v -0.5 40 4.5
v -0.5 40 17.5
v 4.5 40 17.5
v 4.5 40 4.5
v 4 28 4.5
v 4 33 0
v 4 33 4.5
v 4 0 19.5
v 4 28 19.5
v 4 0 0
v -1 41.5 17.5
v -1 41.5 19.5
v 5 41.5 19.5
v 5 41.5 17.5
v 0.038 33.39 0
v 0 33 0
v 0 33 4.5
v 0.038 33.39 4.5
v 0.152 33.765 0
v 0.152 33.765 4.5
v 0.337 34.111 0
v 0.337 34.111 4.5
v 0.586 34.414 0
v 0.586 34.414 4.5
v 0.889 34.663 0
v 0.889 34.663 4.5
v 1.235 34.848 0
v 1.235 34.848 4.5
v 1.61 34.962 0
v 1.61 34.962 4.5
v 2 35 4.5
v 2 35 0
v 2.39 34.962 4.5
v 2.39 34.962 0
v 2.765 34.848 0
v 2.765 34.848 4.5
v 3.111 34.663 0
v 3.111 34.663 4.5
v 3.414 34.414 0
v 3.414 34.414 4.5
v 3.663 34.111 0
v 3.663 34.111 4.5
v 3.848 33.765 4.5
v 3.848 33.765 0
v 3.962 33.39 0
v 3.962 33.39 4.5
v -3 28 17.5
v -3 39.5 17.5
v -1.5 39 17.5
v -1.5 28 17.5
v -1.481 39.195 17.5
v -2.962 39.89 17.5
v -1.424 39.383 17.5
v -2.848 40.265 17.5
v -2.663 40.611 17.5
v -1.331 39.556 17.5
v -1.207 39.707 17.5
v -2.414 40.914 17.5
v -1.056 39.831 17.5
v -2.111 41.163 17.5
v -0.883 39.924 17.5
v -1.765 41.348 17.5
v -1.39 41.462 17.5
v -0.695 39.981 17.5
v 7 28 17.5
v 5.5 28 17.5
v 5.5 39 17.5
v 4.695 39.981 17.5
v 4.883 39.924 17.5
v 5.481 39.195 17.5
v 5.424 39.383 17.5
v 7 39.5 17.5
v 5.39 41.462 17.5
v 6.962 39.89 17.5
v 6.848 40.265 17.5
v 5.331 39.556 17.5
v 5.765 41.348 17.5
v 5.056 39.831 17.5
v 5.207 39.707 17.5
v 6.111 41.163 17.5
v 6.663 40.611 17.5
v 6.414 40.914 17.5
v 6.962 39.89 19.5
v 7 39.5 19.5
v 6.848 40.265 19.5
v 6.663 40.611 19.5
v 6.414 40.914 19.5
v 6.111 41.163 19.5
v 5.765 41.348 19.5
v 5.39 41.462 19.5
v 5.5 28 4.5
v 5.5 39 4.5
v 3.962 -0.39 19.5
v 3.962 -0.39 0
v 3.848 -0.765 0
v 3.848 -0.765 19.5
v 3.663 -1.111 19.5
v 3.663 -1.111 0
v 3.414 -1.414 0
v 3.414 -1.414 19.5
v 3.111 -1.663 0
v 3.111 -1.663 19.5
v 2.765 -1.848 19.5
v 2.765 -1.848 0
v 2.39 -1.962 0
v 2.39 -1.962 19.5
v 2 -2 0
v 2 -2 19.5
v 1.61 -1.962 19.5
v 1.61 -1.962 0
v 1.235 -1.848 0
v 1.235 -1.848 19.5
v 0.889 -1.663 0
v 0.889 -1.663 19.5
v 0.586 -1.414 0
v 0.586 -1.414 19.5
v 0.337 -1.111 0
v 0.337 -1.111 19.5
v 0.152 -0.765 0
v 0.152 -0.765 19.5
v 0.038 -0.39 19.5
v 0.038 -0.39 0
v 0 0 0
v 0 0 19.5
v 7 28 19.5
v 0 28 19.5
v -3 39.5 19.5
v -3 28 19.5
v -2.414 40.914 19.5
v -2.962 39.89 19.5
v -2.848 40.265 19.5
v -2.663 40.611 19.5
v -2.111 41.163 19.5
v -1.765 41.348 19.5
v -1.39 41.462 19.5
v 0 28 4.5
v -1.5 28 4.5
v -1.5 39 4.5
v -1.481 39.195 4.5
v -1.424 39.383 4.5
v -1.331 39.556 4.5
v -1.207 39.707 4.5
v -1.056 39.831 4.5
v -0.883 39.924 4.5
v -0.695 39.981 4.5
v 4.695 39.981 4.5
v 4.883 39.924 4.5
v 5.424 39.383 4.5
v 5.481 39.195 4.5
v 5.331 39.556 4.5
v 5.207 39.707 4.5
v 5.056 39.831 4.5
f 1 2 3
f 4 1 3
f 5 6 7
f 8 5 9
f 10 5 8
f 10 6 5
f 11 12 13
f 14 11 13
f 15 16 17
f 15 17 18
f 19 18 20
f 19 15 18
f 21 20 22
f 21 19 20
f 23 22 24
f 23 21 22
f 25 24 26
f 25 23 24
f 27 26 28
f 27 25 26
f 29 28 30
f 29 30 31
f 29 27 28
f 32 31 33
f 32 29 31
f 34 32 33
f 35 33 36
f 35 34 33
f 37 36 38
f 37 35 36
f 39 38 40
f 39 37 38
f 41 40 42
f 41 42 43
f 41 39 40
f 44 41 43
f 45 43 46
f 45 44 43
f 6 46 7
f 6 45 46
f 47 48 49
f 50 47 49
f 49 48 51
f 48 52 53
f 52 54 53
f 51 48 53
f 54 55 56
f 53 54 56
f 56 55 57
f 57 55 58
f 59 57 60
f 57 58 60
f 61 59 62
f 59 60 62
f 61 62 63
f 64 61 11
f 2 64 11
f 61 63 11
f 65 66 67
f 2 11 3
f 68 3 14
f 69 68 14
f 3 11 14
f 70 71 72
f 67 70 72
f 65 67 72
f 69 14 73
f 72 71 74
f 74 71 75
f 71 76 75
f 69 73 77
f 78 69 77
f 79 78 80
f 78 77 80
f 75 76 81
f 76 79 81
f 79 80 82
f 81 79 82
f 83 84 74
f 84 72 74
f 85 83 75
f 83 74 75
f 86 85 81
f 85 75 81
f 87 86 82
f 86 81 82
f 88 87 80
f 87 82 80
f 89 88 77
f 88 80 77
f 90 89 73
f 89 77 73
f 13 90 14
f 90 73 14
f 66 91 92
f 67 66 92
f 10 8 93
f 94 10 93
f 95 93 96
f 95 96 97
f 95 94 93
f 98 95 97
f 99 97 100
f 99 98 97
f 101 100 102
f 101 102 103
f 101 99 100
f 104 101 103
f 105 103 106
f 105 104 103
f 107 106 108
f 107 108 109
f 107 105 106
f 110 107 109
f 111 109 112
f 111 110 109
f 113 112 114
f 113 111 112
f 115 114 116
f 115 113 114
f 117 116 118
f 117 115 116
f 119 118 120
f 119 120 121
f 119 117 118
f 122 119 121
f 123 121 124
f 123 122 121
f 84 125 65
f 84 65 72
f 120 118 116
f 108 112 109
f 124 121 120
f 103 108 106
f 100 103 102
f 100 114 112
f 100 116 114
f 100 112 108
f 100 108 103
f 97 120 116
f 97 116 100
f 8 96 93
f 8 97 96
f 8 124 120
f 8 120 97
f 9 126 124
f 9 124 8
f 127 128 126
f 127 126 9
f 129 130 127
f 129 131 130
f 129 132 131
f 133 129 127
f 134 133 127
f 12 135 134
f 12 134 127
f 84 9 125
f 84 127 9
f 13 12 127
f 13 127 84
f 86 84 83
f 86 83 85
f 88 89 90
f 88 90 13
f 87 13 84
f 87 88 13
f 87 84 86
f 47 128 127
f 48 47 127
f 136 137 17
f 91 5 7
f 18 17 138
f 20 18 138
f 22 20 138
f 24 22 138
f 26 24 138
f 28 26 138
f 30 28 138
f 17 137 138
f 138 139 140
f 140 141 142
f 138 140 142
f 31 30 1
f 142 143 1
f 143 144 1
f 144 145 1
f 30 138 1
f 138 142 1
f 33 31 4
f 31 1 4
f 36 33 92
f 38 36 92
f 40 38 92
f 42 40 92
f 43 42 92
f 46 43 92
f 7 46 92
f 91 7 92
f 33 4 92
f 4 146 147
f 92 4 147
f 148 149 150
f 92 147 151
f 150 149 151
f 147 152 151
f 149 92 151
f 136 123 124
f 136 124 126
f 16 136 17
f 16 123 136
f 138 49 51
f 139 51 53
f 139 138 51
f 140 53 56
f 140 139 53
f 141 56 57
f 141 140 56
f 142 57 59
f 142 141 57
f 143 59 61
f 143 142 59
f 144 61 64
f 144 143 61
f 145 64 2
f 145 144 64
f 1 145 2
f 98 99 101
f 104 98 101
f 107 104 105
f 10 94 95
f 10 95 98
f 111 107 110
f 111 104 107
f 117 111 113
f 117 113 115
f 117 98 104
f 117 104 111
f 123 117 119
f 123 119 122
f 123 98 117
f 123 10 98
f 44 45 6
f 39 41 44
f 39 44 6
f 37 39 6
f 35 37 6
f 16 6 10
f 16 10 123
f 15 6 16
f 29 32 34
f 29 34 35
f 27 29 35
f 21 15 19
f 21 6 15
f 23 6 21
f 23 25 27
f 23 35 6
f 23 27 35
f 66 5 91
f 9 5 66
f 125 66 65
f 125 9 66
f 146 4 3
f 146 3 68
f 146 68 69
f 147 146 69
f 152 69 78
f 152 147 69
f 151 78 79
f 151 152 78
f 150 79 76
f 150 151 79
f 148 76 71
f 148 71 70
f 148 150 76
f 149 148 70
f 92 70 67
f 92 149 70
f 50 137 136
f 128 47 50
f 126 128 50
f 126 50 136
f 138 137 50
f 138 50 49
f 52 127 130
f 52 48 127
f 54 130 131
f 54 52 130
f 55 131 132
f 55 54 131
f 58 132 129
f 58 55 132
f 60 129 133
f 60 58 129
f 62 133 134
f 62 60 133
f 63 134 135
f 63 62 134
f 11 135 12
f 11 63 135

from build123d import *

# Parameters (mm, degrees)
BASE_EXTRUSION_DEPTH = 19.5
ESQUISSE2_W          = 7
ESQUISSE2_H          = 12
BOSS_EXTRU_1_DEPTH   = 15
CONG_1_R             = 1
ESQUISSE3_W          = 10
ESQUISSE3_H          = 13.5
BOSS_EXTRU_2_DEPTH   = 2
CONG_2_R             = 2


with BuildPart() as part:
    # Esquisse1 → Base-Extrusion (new body)
    with BuildSketch(Plane.XY):
        with BuildLine():
            Line((0, 0), (0, 33))
            ThreePointArc((0, 33), (2, 35), (4, 33))
            Line((4, 33), (4, 0))
            ThreePointArc((4, 0), (2, -2), (0, 0))
        make_face()
    extrude(amount=BASE_EXTRUSION_DEPTH)

    # Esquisse2 → Boss.-Extru.1 (add)
    with BuildSketch(Plane.XY.offset(19.5)):
        with Locations((2, 34)):
            Rectangle(ESQUISSE2_W, ESQUISSE2_H)
    extrude(amount=-BOSS_EXTRU_1_DEPTH)

    # Congé1
    cong_1_edges = [part.edges().sort_by_distance(p)[0] for p in [
        (-1.5, 40, 12),
        (5.5, 40, 12),
    ]]
    fillet(cong_1_edges, radius=CONG_1_R)

    # Esquisse3 → Boss.-Extru.2 (add)
    with BuildSketch(Plane.XY.offset(19.5)):
        with Locations((2, 34.75)):
            Rectangle(ESQUISSE3_W, ESQUISSE3_H)
    extrude(amount=-BOSS_EXTRU_2_DEPTH)

    # Congé2
    cong_2_edges = [part.edges().sort_by_distance(p)[0] for p in [
        (-3, 41.5, 18.5),
        (7, 41.5, 18.5),
    ]]
    fillet(cong_2_edges, radius=CONG_2_R)


solid = part.part
